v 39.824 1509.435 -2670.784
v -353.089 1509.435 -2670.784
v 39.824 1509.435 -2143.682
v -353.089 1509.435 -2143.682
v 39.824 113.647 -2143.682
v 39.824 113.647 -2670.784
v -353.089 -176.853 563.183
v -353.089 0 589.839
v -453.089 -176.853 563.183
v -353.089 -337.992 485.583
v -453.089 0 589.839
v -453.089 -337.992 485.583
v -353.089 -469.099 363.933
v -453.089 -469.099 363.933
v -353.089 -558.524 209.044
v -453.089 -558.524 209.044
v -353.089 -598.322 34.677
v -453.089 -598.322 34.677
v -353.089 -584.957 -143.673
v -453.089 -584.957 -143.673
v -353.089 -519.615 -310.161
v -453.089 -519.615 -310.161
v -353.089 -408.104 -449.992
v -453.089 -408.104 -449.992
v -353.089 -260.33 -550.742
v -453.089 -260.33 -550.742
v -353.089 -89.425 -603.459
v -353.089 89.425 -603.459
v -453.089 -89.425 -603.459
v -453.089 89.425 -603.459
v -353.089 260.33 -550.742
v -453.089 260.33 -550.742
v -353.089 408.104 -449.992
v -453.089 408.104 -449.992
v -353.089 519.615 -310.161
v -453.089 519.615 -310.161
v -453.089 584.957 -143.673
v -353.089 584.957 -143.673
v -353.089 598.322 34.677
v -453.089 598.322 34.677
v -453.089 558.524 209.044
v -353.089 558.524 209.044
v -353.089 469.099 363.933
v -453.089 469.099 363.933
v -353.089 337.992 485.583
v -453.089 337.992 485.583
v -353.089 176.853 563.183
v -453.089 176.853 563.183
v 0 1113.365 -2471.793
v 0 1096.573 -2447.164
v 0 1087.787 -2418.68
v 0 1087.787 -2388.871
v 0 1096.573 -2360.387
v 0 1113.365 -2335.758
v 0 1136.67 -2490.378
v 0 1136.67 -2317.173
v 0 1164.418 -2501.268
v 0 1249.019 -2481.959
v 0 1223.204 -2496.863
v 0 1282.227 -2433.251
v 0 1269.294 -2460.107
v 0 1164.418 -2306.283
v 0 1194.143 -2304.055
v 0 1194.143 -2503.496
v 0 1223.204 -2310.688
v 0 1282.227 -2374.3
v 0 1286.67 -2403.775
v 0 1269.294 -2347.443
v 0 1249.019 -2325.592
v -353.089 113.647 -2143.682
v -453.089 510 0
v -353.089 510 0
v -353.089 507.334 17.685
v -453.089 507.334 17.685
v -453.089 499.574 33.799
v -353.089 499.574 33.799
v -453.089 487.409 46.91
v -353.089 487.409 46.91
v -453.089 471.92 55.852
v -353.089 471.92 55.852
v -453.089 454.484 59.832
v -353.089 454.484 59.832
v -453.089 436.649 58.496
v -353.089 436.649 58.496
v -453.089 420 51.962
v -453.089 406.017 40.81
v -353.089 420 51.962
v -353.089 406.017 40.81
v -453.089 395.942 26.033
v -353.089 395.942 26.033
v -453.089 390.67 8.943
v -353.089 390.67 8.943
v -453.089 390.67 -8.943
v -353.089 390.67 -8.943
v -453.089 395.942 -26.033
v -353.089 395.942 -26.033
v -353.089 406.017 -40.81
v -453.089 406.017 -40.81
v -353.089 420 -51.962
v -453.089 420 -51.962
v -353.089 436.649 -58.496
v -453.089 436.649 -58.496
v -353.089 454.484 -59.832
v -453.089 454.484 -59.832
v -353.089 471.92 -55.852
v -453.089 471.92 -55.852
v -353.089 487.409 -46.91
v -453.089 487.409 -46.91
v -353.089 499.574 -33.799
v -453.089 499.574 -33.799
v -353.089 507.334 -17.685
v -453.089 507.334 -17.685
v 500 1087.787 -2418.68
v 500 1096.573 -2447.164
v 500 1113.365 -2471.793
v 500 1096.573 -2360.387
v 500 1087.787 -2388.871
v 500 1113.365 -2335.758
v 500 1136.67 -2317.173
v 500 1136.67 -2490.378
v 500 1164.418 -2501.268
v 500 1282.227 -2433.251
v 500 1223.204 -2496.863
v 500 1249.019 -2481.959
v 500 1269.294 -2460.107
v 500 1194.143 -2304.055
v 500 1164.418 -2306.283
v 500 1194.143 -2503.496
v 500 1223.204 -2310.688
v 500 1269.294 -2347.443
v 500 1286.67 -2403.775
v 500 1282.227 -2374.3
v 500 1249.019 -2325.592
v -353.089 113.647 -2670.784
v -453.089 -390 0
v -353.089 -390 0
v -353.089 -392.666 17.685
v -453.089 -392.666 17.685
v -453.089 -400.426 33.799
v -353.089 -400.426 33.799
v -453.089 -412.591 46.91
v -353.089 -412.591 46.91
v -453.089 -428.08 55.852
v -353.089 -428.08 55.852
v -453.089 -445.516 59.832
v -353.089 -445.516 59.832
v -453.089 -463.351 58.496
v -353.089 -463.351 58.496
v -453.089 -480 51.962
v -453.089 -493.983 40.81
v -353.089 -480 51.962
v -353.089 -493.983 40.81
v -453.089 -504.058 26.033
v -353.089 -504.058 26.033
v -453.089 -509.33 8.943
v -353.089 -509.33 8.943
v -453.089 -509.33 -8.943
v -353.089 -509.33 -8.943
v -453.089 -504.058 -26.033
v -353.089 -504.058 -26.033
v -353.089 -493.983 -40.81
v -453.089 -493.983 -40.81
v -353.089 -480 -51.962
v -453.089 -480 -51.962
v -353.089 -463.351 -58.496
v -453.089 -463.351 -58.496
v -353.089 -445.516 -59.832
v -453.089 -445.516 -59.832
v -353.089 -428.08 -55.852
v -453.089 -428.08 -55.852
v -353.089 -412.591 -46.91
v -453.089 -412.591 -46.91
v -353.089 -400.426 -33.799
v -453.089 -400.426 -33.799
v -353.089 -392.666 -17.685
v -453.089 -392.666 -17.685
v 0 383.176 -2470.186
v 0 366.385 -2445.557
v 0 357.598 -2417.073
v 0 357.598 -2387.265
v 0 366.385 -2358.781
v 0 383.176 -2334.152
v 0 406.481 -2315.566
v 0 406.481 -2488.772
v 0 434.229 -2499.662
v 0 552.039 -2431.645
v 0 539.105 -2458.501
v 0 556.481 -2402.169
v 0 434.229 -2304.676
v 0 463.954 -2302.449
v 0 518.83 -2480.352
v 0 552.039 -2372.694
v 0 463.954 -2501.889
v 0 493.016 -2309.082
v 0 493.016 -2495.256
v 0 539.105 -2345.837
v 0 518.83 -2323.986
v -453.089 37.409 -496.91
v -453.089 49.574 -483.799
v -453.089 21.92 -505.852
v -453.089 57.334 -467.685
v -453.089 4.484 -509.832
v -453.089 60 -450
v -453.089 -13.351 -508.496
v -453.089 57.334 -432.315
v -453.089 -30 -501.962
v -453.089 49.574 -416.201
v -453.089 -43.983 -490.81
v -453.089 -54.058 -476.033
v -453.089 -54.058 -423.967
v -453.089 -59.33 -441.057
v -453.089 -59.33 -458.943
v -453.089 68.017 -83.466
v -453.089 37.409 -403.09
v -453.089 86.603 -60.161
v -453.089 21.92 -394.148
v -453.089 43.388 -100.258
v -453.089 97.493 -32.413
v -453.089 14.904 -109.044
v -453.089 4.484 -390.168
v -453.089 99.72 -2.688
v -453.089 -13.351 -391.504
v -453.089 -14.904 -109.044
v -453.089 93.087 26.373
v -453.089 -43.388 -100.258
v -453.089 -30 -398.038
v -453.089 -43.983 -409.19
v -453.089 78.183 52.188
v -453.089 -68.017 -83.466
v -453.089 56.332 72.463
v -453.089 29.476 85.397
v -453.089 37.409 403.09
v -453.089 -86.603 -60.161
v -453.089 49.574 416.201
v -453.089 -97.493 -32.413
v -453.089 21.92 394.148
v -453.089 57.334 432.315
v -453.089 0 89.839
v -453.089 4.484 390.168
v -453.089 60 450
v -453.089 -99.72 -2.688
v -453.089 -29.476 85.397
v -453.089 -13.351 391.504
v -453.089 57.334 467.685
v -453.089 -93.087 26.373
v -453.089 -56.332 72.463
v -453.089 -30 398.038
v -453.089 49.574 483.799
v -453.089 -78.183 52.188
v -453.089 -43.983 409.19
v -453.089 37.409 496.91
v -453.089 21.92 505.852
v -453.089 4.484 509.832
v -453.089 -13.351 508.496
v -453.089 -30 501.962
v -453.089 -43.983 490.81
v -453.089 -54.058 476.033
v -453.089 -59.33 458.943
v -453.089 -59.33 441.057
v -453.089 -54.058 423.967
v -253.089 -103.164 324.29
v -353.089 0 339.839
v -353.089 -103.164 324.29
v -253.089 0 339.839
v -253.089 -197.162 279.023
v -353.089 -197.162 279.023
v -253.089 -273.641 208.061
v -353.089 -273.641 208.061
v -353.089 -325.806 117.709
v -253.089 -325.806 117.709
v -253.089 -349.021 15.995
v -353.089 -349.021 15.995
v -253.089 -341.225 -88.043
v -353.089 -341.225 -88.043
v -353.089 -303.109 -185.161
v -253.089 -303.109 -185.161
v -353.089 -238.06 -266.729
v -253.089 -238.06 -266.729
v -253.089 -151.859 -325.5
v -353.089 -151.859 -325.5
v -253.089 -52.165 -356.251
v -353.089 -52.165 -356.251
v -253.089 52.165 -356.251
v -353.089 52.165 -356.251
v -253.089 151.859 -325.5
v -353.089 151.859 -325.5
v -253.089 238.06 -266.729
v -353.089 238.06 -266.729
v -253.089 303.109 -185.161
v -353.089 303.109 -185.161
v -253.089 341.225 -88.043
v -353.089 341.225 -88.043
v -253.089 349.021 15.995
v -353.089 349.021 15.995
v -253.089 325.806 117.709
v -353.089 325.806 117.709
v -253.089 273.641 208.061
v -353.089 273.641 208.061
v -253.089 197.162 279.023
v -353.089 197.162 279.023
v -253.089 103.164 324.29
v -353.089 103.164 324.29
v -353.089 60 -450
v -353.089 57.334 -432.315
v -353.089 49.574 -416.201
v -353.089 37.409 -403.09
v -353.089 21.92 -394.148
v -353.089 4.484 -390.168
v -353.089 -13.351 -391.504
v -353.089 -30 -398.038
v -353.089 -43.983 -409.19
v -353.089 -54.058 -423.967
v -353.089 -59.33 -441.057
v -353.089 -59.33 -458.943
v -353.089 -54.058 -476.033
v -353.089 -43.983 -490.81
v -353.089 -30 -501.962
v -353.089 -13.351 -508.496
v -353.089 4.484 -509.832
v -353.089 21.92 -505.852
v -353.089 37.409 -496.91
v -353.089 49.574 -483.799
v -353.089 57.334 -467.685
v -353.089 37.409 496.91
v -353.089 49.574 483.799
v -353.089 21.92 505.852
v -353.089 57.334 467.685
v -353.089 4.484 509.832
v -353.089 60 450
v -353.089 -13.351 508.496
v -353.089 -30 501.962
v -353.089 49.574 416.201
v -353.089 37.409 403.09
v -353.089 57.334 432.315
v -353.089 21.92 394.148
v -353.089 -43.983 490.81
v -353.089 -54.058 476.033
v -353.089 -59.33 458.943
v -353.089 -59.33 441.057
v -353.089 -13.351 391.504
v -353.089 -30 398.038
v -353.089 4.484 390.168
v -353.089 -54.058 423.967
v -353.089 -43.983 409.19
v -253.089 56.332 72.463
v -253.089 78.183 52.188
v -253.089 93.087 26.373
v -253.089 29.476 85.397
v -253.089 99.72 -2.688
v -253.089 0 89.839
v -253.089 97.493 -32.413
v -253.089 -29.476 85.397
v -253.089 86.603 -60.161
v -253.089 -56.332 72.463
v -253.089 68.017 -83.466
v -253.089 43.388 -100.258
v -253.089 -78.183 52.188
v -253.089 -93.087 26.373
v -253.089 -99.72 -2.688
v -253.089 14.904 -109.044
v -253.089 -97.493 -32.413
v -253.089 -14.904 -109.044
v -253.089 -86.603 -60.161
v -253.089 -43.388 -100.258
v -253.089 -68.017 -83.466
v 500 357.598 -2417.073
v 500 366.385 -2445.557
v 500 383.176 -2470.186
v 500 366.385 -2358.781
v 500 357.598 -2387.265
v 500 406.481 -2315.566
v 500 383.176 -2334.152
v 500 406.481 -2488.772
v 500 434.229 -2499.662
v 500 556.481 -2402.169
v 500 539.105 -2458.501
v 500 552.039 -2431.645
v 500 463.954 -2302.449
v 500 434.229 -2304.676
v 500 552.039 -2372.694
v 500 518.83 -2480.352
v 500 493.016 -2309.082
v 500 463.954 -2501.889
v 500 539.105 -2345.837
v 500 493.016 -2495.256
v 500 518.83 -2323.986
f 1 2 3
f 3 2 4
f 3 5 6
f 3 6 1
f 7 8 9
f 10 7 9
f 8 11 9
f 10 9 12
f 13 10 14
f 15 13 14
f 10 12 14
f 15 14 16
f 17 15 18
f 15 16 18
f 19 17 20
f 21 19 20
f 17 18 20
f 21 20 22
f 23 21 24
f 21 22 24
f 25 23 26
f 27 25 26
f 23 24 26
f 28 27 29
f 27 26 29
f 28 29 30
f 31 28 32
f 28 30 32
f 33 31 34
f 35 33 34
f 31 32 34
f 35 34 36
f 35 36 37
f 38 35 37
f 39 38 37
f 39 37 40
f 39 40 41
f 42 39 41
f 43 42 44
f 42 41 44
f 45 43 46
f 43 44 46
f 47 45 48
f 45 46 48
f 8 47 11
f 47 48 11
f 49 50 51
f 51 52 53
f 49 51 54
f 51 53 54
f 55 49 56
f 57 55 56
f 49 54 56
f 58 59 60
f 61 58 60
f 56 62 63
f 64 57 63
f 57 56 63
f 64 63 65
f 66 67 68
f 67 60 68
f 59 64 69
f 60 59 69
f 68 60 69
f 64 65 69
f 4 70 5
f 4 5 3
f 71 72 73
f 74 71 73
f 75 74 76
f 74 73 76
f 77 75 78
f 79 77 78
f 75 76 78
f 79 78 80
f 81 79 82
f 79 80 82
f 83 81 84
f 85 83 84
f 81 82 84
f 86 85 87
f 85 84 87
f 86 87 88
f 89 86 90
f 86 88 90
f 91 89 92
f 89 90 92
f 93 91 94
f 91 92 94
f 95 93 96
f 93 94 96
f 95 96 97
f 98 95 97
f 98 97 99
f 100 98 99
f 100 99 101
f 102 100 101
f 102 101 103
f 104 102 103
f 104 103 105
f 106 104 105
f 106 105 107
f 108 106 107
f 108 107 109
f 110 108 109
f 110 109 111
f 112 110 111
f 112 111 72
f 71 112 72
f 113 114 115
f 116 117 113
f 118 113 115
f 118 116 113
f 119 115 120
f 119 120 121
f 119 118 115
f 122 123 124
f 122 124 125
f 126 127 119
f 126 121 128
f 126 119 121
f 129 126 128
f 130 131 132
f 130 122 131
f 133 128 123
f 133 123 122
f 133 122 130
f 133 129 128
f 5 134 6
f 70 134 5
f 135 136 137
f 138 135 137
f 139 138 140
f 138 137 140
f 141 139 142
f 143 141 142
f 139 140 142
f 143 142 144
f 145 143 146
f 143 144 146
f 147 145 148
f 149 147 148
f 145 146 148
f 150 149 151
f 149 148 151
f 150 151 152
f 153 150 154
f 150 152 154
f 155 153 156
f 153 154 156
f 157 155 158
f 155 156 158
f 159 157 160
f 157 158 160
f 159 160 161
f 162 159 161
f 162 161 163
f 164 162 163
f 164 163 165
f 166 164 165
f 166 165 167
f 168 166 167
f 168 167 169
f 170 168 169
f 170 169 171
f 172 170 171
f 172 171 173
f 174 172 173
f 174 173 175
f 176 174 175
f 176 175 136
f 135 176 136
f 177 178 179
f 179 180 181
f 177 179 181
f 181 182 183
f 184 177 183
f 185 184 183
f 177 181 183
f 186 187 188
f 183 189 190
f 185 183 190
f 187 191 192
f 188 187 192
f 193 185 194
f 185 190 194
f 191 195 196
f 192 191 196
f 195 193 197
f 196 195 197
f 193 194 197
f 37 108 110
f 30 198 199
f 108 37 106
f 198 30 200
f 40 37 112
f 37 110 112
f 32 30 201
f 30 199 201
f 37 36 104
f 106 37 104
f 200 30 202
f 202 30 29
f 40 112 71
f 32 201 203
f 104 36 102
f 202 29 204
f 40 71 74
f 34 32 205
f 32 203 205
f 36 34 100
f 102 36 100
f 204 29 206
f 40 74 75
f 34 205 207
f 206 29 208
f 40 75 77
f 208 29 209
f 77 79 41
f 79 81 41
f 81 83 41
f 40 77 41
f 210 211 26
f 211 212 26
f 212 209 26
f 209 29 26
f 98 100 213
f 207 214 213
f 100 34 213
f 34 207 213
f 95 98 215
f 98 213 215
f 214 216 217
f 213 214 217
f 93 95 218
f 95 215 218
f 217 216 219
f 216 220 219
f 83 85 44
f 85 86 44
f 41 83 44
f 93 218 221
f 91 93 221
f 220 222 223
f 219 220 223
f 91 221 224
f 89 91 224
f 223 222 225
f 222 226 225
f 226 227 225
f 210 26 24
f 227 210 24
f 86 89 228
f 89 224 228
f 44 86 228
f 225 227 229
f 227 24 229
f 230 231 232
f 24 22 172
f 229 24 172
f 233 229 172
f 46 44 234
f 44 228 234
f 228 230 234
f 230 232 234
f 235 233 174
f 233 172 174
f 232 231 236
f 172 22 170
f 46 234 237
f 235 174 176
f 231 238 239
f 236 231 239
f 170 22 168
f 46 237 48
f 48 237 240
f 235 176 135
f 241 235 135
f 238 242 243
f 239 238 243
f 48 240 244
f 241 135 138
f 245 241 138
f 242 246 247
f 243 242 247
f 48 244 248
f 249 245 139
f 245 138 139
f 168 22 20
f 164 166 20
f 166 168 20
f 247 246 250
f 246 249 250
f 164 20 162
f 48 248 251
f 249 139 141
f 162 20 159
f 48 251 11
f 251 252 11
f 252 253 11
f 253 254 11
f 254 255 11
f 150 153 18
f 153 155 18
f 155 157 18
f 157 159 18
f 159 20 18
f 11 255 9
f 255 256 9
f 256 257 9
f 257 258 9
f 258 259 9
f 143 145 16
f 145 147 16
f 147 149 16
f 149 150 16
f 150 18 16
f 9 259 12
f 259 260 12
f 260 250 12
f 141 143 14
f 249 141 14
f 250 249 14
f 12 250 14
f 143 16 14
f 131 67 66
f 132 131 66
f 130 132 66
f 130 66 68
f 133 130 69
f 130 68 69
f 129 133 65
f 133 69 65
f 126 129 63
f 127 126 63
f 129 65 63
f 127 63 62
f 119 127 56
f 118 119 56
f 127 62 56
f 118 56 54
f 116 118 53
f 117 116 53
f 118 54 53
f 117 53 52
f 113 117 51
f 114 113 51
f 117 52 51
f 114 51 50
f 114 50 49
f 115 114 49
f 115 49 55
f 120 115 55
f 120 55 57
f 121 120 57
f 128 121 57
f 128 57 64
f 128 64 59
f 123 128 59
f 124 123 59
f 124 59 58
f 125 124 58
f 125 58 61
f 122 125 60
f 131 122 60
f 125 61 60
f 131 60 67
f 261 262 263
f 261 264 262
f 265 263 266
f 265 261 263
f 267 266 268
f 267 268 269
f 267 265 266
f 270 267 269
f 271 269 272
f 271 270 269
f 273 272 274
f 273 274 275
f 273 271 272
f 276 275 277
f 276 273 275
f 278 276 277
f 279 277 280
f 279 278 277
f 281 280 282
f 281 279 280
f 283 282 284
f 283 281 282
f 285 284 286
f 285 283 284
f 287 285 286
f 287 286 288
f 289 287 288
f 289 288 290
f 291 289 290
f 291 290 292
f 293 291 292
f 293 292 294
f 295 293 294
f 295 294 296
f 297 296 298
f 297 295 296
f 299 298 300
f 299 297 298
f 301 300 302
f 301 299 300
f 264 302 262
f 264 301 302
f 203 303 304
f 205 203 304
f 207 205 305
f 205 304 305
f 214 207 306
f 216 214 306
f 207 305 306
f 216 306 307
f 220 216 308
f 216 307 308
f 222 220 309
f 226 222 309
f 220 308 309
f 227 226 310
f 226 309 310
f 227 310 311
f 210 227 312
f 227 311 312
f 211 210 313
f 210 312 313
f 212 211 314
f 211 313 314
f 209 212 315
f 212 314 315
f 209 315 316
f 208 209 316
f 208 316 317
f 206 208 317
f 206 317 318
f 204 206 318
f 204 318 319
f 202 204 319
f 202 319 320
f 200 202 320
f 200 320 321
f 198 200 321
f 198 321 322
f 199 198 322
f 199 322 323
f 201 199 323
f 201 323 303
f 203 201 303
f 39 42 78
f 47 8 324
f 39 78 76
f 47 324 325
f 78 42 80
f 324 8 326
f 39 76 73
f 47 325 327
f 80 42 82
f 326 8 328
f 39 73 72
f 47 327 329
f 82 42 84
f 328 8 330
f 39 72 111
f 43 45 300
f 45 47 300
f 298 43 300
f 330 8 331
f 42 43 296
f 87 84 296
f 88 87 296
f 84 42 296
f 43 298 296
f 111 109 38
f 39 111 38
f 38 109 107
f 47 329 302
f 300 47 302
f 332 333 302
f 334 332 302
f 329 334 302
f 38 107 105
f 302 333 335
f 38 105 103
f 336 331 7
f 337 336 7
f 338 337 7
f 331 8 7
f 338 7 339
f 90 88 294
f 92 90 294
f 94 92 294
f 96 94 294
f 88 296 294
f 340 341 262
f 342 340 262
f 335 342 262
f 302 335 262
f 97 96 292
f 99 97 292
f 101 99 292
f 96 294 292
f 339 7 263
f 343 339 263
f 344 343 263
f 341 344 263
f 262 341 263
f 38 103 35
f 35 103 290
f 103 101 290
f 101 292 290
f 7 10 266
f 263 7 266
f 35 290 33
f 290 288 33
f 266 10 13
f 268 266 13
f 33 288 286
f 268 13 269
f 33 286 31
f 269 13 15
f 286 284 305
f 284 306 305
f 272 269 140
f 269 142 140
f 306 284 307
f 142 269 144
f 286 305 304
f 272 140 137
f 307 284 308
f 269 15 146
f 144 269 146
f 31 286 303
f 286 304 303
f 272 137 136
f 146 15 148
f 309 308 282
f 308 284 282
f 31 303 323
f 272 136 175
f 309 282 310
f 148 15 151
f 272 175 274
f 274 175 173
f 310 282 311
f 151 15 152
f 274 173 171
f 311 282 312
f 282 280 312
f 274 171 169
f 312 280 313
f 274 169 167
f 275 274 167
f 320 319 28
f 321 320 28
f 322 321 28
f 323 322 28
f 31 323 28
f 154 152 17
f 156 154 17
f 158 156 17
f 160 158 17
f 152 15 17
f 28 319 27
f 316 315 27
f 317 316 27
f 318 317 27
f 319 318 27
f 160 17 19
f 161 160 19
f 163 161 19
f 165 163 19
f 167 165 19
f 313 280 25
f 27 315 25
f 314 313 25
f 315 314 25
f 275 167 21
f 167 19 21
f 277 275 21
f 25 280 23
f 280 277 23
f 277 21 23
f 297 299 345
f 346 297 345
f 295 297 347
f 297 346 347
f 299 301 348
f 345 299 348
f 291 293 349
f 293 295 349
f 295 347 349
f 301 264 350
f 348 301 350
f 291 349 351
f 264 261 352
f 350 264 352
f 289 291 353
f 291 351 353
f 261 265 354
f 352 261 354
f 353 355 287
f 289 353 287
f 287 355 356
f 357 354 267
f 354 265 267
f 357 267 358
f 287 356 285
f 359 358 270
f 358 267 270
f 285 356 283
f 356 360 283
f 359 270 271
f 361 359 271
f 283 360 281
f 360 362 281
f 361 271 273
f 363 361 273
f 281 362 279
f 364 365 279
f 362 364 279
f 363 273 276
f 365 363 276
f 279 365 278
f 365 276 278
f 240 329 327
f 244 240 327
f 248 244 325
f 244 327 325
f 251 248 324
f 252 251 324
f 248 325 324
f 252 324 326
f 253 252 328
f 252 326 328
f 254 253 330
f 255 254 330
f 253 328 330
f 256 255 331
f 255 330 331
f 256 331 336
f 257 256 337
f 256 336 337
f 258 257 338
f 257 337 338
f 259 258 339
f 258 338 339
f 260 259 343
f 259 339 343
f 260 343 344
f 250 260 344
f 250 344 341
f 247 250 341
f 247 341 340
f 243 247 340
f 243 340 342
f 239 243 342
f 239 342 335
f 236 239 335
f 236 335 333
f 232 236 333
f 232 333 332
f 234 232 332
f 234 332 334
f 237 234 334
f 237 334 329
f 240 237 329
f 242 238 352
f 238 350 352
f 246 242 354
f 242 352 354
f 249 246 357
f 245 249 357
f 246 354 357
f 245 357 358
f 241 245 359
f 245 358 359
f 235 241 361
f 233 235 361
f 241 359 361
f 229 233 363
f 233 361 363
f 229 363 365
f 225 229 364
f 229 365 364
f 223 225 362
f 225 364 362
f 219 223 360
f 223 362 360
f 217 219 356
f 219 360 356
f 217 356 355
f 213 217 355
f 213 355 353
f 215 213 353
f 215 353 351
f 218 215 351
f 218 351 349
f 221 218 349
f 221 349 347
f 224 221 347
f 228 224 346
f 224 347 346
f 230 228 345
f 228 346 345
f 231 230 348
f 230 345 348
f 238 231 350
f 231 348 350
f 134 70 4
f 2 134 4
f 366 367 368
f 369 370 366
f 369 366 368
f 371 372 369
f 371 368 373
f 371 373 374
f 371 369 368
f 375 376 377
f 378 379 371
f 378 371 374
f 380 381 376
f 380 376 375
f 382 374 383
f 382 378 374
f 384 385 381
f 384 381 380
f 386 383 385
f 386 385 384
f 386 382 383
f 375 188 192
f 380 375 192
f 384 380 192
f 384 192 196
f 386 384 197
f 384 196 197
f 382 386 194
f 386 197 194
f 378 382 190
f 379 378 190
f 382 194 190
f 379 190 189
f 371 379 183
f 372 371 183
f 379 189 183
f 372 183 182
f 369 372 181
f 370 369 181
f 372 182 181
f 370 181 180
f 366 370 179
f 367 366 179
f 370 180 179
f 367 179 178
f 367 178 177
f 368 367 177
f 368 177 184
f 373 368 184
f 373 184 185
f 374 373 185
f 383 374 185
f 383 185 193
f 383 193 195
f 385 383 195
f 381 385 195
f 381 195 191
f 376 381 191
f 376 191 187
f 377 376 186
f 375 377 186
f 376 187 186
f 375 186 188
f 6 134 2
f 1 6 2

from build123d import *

# Parameters (mm, degrees)
F0_W     = 100
F0_H     = 250
F2_R     = 60
F3_DEPTH = 100.001
F4_R     = 100
F5_R     = 100
F6_DEPTH = 500
F7_W     = 1395.787105
F7_H     = 527.101279
F8_DEPTH = 392.912507


with BuildPart() as f1:
    # F0 (on Front) → F1 (revolve)
    with BuildSketch(Plane.XZ):
        Polygon((-353.088562, 589.839354), (-453.088562, 589.839354), (-453.088562, 89.839354), (-353.088562, 89.839354), (-353.088562, 339.839354), align=None)
        with Locations((-303.088562, 214.839354)):
            Rectangle(F0_W, F0_H)
    revolve(axis=Axis((-324.166805, 0, -10.160646), (1, 0, 0)))

    # F2 (on face) → F3 (cut, through all)
    with BuildSketch(Plane.YZ.offset(-353.088562)):
        with Locations((-450, 0)):
            Circle(F2_R)
        with Locations((0, 450)):
            Circle(F2_R)
        with Locations((0, -450)):
            Circle(F2_R)
        with Locations((450, 0)):
            Circle(F2_R)
    extrude(amount=-F3_DEPTH, mode=Mode.SUBTRACT)


with BuildPart() as f6:
    # F4 (on Right) + F5 (on face) → F6 (new body)
    with BuildSketch(Plane.YZ):
        with Locations((1186.66978, -2403.77543)):
            Circle(F4_R)
    with BuildSketch(Plane.YZ):
        with Locations((456.481487, -2402.169036)):
            Circle(F5_R)
    extrude(amount=F6_DEPTH)


with BuildPart() as f8:
    # F7 (on face) → F8 (new body)
    with BuildSketch(Plane.YZ.offset(-353.088562)):
        with Locations((811.541029, -2407.23288)):
            Rectangle(F7_W, F7_H)
    extrude(amount=F8_DEPTH)


solid = Compound([f1.part, f6.part, f8.part])
